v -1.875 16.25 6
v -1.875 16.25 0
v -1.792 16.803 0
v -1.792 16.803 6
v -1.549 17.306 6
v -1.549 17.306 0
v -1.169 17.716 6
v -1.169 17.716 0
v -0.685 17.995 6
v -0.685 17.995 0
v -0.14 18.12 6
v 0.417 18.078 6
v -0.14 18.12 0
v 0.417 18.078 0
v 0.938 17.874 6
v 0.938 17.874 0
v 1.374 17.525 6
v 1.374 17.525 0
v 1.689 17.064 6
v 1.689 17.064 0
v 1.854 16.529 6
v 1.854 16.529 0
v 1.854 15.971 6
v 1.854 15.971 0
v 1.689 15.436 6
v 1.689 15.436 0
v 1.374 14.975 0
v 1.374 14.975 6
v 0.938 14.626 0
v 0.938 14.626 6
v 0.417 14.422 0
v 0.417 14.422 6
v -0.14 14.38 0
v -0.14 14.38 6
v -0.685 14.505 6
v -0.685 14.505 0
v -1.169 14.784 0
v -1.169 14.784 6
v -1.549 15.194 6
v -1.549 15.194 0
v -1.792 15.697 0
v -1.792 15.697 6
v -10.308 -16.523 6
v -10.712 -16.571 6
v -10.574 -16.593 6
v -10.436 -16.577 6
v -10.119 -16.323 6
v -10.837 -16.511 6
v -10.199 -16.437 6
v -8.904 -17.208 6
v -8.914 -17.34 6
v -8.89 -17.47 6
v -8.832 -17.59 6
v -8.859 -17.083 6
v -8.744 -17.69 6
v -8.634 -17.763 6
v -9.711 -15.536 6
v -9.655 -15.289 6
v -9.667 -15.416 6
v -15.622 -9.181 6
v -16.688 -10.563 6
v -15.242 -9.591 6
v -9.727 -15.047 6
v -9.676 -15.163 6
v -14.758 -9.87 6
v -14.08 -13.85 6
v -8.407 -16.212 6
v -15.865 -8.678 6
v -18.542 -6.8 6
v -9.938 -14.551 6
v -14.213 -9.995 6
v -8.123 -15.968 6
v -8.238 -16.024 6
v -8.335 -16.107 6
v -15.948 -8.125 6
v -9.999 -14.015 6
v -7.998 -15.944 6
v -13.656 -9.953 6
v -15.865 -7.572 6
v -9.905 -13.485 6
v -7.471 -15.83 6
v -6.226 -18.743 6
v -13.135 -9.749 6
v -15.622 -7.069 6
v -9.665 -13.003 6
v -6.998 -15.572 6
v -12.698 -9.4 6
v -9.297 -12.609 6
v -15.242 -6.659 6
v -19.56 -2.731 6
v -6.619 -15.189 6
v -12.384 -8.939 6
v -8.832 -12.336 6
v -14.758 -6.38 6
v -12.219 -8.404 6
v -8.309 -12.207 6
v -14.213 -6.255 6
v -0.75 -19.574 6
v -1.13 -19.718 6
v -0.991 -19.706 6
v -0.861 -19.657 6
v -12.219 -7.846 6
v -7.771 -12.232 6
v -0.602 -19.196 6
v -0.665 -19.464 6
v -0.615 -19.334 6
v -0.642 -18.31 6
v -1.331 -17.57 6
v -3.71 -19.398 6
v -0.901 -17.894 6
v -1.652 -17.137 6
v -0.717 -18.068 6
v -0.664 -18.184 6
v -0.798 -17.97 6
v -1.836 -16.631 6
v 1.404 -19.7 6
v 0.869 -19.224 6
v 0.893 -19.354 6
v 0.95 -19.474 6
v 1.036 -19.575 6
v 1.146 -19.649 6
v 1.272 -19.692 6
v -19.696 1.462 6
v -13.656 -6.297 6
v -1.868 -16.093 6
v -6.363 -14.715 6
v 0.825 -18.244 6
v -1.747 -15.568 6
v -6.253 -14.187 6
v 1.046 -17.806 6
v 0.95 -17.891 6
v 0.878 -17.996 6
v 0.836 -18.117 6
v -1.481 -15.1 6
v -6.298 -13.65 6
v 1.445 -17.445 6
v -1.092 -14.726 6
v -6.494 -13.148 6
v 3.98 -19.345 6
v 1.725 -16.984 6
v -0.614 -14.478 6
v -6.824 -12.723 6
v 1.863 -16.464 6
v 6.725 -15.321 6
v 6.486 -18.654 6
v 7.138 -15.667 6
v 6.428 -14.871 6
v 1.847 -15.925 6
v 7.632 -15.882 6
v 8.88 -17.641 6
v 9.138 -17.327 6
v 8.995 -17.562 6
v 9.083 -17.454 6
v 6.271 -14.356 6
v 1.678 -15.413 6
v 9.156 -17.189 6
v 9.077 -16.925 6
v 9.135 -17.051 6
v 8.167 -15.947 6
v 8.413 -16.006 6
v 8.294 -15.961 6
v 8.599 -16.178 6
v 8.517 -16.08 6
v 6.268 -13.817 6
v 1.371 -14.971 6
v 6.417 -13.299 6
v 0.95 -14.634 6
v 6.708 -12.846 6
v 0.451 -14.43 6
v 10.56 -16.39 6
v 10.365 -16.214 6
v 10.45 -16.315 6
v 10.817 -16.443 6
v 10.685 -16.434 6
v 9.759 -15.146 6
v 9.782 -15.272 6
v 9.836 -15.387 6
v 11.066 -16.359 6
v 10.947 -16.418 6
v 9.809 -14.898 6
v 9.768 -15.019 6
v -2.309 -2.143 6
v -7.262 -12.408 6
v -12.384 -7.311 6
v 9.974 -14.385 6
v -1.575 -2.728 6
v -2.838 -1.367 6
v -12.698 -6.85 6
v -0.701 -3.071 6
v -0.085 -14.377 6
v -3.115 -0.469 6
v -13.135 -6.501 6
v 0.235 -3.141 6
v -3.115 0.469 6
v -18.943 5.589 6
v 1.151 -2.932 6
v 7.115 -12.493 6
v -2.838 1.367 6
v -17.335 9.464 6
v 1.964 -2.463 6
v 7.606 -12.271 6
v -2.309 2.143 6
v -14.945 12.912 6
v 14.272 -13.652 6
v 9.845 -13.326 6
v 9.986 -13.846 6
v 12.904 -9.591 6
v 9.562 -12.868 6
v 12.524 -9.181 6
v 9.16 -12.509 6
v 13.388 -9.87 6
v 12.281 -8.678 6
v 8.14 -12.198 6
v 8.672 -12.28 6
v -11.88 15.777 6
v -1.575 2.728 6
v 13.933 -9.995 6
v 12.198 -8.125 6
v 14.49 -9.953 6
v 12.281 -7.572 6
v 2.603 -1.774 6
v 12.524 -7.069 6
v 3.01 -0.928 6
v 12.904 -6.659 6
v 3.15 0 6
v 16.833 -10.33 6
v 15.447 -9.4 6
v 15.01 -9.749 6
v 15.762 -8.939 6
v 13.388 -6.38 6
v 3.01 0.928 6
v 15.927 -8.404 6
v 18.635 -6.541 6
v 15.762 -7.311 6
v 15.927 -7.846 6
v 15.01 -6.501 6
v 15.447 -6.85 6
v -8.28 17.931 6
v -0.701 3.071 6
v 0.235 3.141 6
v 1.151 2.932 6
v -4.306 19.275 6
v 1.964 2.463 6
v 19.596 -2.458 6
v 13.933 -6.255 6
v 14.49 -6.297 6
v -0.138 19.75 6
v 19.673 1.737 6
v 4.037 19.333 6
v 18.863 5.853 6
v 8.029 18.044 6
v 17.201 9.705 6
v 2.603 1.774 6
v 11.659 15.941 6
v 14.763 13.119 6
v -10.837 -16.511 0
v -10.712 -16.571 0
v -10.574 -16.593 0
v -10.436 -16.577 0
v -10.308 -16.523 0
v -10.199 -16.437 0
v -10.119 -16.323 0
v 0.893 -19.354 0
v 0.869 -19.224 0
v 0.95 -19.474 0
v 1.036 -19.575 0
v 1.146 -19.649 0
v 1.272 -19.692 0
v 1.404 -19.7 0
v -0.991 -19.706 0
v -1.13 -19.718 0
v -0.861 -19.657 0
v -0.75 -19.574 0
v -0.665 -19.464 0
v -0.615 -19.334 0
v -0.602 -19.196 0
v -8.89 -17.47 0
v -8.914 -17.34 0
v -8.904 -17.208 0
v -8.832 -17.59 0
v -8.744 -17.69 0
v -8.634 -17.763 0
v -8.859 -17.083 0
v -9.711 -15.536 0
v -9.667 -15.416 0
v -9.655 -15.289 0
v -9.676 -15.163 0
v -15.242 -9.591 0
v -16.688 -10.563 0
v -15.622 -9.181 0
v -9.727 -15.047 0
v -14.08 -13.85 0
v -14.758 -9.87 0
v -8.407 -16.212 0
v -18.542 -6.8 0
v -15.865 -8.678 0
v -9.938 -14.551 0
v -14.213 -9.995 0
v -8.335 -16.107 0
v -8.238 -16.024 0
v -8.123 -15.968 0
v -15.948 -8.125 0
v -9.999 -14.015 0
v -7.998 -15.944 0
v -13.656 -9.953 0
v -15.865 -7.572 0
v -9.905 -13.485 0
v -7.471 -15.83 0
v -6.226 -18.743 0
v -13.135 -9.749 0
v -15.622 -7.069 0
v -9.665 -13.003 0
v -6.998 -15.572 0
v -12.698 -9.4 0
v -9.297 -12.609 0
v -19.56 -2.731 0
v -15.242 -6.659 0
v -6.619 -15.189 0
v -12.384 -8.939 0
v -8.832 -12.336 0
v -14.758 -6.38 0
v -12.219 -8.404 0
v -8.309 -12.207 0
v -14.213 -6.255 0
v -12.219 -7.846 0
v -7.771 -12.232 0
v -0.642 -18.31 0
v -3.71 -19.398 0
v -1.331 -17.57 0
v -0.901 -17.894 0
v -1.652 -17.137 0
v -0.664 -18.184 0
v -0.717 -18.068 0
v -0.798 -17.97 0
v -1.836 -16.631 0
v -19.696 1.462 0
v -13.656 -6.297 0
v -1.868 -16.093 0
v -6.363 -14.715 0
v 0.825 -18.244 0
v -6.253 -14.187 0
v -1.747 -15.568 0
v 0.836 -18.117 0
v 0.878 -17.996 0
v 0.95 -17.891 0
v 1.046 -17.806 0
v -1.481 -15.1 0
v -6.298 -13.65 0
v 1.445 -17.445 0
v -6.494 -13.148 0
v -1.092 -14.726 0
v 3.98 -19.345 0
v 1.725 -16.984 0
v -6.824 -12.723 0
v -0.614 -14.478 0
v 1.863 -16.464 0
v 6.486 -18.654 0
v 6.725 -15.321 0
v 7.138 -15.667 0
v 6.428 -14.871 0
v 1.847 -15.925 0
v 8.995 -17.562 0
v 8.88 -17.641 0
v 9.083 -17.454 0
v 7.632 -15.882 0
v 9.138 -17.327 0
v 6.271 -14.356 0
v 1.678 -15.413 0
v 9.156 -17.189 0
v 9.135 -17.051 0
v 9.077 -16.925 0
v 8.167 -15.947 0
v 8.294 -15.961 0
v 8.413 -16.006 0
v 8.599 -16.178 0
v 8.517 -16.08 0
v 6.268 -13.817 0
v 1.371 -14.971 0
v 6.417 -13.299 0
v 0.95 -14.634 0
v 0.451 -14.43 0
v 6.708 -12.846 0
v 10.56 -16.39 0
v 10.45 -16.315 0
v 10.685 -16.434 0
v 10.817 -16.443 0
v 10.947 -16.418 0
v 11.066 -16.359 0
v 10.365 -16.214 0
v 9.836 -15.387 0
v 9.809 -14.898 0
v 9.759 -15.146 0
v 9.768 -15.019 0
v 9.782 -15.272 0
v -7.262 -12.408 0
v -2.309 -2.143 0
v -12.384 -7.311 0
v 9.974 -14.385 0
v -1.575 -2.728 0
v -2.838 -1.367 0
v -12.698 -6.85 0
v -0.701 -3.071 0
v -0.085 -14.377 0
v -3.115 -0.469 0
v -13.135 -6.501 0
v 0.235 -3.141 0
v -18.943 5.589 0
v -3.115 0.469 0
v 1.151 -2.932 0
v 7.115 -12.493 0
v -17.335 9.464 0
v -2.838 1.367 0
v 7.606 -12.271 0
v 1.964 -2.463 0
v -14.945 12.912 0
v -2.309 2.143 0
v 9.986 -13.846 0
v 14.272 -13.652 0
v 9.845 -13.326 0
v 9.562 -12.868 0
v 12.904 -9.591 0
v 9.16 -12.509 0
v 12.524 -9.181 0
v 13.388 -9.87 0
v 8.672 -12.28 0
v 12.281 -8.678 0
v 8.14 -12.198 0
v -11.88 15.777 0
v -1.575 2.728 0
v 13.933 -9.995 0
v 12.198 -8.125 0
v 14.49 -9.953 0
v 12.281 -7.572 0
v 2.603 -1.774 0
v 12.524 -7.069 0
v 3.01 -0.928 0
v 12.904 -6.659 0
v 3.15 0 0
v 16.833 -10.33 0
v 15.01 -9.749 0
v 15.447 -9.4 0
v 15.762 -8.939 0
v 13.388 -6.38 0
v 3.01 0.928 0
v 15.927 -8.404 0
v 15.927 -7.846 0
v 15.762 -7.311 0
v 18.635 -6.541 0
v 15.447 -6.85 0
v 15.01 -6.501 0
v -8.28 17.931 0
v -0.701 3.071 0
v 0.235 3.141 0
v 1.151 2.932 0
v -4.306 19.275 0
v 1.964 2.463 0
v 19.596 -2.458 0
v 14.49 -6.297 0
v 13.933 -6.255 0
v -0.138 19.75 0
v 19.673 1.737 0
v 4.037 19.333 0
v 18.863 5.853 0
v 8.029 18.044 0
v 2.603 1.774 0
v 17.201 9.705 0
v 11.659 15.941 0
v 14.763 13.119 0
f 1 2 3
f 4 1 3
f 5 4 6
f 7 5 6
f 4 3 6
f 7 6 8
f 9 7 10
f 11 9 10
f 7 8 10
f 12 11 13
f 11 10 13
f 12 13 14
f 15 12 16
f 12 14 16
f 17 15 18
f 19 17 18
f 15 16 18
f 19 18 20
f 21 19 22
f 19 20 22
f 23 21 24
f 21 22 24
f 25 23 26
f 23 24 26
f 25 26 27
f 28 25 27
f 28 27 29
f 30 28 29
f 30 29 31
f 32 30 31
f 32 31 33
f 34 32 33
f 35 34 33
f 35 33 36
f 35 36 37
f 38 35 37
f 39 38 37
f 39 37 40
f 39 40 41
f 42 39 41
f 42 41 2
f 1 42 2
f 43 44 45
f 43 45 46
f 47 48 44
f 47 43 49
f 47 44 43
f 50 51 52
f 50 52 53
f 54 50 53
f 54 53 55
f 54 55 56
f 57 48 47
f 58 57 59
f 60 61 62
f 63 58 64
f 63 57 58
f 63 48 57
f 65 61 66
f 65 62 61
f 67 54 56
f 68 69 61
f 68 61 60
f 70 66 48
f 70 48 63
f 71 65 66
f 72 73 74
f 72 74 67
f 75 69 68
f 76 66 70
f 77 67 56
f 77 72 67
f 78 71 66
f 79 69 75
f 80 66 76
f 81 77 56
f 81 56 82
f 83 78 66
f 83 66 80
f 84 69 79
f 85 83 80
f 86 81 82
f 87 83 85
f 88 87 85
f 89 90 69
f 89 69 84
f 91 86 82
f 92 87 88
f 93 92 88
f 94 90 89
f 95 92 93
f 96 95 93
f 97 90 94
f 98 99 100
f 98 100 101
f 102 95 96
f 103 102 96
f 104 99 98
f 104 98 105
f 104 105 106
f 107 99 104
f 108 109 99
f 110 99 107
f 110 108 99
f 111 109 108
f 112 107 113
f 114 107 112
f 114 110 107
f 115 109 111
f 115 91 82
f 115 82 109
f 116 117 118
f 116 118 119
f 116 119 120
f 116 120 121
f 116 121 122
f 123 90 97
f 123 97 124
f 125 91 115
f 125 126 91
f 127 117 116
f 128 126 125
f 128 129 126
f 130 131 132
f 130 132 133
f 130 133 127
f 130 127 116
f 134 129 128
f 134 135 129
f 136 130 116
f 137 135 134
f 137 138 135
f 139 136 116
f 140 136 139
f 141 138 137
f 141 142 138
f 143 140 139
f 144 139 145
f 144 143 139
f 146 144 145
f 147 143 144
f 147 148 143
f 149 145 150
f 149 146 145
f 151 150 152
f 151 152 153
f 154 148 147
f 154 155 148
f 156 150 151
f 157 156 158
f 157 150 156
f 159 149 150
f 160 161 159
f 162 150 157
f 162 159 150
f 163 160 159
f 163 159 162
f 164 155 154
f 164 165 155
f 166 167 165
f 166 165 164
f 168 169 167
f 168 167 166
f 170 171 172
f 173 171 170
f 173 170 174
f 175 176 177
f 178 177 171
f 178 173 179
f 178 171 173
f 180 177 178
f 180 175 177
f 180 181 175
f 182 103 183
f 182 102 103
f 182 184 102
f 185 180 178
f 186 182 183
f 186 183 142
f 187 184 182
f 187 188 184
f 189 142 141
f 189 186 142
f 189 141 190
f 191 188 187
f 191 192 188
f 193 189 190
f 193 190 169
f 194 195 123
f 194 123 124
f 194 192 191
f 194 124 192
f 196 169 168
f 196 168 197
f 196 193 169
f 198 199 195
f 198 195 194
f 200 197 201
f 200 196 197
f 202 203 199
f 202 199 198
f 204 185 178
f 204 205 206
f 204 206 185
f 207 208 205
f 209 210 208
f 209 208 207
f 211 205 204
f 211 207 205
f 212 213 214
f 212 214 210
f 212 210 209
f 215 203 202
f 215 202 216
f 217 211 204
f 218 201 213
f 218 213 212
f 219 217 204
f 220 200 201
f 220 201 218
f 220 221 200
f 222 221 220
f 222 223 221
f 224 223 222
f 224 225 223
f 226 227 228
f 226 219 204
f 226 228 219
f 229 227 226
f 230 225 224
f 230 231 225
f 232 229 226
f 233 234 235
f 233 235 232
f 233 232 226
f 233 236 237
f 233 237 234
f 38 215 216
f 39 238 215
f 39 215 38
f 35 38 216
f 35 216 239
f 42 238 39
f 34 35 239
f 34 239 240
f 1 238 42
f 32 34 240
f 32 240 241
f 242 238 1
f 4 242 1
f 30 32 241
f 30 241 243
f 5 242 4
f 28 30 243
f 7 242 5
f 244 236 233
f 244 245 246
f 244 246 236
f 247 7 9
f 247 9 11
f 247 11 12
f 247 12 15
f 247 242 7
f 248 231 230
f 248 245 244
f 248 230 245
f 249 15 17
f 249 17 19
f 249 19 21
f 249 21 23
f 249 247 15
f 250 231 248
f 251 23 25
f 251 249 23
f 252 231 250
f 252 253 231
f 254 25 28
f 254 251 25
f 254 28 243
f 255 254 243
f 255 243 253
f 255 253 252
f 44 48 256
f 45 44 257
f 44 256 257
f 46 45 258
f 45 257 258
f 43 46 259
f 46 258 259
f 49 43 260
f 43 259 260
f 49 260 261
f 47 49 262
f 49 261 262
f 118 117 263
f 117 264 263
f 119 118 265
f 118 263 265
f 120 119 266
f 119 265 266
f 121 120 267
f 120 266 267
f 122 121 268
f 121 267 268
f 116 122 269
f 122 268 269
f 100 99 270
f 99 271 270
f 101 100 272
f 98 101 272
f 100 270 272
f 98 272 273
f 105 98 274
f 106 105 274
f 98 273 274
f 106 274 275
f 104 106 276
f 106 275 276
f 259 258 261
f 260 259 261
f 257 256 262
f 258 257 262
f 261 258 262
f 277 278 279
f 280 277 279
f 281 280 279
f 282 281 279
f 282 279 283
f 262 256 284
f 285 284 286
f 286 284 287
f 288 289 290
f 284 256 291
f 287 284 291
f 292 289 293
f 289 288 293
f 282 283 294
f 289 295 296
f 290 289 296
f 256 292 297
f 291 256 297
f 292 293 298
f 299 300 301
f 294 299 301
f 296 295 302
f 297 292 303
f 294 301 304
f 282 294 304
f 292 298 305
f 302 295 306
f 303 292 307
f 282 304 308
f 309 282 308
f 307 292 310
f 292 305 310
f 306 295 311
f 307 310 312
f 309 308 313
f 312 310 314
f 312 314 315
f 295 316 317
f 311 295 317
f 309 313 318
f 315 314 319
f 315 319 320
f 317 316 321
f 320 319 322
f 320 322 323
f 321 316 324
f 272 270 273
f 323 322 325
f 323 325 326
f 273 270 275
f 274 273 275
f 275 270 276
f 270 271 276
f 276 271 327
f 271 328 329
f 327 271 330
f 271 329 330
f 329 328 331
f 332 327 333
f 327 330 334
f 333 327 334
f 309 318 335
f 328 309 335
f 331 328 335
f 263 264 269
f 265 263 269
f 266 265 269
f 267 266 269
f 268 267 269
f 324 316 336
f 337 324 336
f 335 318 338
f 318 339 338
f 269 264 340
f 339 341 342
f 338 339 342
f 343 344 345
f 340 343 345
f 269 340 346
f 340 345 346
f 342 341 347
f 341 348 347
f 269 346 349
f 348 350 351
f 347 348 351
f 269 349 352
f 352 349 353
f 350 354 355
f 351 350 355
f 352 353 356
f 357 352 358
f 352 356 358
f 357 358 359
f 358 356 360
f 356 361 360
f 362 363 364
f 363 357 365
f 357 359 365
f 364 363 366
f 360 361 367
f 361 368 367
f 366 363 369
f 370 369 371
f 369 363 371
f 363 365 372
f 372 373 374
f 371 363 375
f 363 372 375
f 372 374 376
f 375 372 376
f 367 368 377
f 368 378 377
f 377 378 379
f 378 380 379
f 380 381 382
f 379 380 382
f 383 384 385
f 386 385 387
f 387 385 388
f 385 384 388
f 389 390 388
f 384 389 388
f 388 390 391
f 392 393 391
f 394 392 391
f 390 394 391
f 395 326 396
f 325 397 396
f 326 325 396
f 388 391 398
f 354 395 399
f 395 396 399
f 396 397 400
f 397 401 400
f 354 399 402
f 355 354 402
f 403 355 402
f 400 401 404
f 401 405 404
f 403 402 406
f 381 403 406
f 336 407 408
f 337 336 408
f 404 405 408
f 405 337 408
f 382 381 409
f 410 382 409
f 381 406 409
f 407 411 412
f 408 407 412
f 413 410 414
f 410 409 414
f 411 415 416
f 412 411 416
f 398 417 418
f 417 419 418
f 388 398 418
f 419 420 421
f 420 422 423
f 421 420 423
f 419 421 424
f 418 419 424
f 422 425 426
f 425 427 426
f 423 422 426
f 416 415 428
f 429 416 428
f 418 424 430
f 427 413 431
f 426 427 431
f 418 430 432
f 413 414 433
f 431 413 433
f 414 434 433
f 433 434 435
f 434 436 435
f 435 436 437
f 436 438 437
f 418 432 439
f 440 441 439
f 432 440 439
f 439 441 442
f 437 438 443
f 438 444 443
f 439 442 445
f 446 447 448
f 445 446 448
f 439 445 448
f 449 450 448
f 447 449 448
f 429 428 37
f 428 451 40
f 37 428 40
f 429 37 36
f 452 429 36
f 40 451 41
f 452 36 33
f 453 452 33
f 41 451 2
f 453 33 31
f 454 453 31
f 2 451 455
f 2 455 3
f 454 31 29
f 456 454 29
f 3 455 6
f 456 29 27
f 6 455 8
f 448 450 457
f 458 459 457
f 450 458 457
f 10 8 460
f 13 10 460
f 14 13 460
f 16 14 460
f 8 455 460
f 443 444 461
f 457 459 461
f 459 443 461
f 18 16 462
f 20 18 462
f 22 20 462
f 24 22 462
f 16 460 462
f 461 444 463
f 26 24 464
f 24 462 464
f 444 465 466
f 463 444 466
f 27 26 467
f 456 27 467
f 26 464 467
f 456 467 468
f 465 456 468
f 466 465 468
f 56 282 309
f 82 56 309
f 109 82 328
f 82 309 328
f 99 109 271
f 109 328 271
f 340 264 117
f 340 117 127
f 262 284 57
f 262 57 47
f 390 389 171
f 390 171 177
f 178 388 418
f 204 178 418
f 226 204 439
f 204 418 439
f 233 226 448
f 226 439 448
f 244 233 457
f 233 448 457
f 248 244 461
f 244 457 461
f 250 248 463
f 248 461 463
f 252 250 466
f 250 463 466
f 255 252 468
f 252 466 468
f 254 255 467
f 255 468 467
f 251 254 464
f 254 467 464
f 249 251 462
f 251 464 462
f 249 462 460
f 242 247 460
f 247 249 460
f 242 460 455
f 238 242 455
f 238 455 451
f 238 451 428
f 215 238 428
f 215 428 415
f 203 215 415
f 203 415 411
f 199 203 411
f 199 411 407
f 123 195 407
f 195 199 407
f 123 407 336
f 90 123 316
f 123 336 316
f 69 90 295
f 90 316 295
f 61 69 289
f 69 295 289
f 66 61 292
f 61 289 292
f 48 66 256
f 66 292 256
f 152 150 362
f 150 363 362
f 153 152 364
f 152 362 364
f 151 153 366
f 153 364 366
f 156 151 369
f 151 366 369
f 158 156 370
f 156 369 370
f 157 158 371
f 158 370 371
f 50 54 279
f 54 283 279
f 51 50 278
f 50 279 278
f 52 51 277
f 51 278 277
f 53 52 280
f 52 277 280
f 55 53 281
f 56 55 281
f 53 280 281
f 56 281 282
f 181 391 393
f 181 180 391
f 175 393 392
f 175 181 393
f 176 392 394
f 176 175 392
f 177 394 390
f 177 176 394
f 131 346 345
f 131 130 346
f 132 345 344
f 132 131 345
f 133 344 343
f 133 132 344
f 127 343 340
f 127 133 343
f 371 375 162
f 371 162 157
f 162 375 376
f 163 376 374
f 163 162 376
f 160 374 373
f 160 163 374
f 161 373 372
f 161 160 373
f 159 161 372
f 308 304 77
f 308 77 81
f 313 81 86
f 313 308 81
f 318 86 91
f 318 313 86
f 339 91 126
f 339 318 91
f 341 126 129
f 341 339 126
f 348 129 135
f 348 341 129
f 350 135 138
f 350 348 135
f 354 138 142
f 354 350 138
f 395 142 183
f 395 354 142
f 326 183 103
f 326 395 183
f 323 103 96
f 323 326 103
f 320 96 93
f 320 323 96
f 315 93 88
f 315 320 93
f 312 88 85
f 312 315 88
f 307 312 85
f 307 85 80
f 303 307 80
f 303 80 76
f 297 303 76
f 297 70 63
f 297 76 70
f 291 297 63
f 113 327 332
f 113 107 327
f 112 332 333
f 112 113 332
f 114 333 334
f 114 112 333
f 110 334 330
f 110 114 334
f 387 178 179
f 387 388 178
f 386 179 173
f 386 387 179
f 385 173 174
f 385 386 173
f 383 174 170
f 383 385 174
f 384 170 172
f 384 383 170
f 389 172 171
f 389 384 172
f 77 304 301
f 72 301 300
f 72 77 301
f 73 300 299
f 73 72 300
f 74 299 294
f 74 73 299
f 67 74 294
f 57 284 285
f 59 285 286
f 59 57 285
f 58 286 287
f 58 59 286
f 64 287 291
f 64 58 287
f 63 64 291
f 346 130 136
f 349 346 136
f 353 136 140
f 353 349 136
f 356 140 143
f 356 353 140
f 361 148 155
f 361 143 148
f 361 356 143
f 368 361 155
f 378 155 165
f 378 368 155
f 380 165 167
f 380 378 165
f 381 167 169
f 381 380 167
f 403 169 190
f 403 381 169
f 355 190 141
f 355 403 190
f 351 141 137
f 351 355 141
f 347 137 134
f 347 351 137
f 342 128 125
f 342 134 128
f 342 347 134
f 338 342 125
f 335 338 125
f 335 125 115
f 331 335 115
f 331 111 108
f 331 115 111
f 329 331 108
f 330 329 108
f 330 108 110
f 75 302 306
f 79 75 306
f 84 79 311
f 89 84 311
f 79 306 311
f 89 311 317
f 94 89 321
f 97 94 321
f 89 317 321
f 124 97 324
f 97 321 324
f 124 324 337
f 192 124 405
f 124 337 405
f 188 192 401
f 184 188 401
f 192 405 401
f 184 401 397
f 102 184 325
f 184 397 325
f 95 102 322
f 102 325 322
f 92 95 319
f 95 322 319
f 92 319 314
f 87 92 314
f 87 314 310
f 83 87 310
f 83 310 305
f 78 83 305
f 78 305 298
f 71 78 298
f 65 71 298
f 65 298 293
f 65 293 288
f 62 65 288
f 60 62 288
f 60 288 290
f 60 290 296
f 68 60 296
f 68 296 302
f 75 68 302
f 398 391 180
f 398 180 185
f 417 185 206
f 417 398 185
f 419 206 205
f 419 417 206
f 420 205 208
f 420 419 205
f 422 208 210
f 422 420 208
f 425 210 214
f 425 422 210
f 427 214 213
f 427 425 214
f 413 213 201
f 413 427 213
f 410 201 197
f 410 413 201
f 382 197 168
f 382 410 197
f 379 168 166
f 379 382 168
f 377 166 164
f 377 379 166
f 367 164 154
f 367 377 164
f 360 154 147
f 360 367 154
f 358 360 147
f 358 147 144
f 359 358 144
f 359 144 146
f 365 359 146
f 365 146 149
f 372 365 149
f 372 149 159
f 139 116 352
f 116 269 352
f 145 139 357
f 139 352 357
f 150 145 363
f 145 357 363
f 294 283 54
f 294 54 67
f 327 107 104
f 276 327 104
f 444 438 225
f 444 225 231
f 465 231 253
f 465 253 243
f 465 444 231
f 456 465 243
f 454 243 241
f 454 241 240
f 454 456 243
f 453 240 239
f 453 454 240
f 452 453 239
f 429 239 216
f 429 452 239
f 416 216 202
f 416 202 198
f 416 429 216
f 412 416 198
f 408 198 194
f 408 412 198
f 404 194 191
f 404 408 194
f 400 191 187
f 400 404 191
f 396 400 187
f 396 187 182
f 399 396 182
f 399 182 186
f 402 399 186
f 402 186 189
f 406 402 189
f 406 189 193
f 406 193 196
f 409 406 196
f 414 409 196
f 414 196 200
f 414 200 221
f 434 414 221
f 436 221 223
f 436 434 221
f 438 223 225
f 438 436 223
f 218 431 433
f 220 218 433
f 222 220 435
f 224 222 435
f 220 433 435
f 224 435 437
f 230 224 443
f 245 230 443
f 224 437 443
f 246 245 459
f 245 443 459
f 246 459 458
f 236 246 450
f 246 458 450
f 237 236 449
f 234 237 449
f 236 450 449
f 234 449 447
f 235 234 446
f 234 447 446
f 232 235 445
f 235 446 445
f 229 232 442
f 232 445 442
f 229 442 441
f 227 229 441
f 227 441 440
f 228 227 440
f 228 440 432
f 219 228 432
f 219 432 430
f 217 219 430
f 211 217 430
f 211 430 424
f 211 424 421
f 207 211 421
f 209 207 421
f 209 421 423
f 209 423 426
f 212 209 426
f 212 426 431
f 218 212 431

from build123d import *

# Parameters (mm, degrees)
SKETCH_1_R          = 19.75
SKETCH_1_R_2        = 3.15
EXTRUDE_1_DEPTH     = 6
SKETCH_2_R          = 1.875
CUT_EXTRUDE_2_DEPTH = 29.567901568
FILLET_1_R          = 0.5


with BuildPart() as part:
    # Эскиз1 → Бобышка-Вытянуть1 (new body)
    with BuildSketch(Plane.XY):
        Circle(SKETCH_1_R)
        Circle(SKETCH_1_R_2, mode=Mode.SUBTRACT)
    extrude(amount=EXTRUDE_1_DEPTH)

    # Эскиз2 → Вырез-Вытянуть2 (cut, through all)
    with BuildSketch(Plane(origin=(0, 0, 0), x_dir=(-1, 0, 0), z_dir=(0, 0, -1))):
        with Locations((-14.072912811, -8.125)):
            Circle(SKETCH_2_R)
        with Locations((0, 16.25)):
            Circle(SKETCH_2_R)
        with Locations((14.072912811, -8.125)):
            Circle(SKETCH_2_R)
        with BuildLine():
            Line((-10.964367017, -17.151598034), (-9.672796655, -15.131189956))
            ThreePointArc((-9.672796655, -15.131189956), (-7.115101419, -12.493124896), (-8.435759199, -15.92198115))
            Line((-8.435759199, -15.92198115), (-9.697895423, -17.896345301))
            Line((-9.697895423, -17.896345301), (-10.964367017, -17.151598034))
        make_face()
        with BuildLine():
            Line((9.371536104, -18.07121939), (8.267596564, -15.942482607))
            ThreePointArc((8.267596564, -15.942482607), (7.261812823, -12.408421028), (9.570960555, -15.266572341))
            Line((9.570960555, -15.266572341), (10.649741954, -17.34679645))
            Line((10.649741954, -17.34679645), (9.371536104, -18.07121939))
        make_face()
        with BuildLine():
            Line((-0.919621357, -20.335903121), (-0.811292651, -17.940393219))
            ThreePointArc((-0.811292651, -17.940393219), (0.084703869, -14.376914243), (0.655408809, -18.006719754))
            Line((0.655408809, -18.006719754), (0.549548851, -20.347637377))
            Line((0.549548851, -20.347637377), (-0.919621357, -20.335903121))
        make_face()
    extrude(amount=-CUT_EXTRUDE_2_DEPTH, mode=Mode.SUBTRACT)

    # Скругление1
    fillet_1_edges = [part.edges().sort_by_distance(p)[0] for p in [
        (9.371126789, -17.385179973, 3),
        (10.637598383, -16.640432706, 3),
        (8.435759199, -15.92198115, 3),
        (9.672796655, -15.131189956, 3),
        (-10.370444112, -16.808223848, 3),
        (-9.092238262, -17.532646788, 3),
        (-9.570960555, -15.266572341, 3),
        (-8.267596564, -15.942482607, 3),
        (0.892214082, -19.729836645, 3),
        (-0.576956126, -19.741570901, 3),
        (-0.655408809, -18.006719754, 3),
        (0.811292651, -17.940393219, 3),
    ]]
    fillet(fillet_1_edges, radius=FILLET_1_R)


solid = part.part
